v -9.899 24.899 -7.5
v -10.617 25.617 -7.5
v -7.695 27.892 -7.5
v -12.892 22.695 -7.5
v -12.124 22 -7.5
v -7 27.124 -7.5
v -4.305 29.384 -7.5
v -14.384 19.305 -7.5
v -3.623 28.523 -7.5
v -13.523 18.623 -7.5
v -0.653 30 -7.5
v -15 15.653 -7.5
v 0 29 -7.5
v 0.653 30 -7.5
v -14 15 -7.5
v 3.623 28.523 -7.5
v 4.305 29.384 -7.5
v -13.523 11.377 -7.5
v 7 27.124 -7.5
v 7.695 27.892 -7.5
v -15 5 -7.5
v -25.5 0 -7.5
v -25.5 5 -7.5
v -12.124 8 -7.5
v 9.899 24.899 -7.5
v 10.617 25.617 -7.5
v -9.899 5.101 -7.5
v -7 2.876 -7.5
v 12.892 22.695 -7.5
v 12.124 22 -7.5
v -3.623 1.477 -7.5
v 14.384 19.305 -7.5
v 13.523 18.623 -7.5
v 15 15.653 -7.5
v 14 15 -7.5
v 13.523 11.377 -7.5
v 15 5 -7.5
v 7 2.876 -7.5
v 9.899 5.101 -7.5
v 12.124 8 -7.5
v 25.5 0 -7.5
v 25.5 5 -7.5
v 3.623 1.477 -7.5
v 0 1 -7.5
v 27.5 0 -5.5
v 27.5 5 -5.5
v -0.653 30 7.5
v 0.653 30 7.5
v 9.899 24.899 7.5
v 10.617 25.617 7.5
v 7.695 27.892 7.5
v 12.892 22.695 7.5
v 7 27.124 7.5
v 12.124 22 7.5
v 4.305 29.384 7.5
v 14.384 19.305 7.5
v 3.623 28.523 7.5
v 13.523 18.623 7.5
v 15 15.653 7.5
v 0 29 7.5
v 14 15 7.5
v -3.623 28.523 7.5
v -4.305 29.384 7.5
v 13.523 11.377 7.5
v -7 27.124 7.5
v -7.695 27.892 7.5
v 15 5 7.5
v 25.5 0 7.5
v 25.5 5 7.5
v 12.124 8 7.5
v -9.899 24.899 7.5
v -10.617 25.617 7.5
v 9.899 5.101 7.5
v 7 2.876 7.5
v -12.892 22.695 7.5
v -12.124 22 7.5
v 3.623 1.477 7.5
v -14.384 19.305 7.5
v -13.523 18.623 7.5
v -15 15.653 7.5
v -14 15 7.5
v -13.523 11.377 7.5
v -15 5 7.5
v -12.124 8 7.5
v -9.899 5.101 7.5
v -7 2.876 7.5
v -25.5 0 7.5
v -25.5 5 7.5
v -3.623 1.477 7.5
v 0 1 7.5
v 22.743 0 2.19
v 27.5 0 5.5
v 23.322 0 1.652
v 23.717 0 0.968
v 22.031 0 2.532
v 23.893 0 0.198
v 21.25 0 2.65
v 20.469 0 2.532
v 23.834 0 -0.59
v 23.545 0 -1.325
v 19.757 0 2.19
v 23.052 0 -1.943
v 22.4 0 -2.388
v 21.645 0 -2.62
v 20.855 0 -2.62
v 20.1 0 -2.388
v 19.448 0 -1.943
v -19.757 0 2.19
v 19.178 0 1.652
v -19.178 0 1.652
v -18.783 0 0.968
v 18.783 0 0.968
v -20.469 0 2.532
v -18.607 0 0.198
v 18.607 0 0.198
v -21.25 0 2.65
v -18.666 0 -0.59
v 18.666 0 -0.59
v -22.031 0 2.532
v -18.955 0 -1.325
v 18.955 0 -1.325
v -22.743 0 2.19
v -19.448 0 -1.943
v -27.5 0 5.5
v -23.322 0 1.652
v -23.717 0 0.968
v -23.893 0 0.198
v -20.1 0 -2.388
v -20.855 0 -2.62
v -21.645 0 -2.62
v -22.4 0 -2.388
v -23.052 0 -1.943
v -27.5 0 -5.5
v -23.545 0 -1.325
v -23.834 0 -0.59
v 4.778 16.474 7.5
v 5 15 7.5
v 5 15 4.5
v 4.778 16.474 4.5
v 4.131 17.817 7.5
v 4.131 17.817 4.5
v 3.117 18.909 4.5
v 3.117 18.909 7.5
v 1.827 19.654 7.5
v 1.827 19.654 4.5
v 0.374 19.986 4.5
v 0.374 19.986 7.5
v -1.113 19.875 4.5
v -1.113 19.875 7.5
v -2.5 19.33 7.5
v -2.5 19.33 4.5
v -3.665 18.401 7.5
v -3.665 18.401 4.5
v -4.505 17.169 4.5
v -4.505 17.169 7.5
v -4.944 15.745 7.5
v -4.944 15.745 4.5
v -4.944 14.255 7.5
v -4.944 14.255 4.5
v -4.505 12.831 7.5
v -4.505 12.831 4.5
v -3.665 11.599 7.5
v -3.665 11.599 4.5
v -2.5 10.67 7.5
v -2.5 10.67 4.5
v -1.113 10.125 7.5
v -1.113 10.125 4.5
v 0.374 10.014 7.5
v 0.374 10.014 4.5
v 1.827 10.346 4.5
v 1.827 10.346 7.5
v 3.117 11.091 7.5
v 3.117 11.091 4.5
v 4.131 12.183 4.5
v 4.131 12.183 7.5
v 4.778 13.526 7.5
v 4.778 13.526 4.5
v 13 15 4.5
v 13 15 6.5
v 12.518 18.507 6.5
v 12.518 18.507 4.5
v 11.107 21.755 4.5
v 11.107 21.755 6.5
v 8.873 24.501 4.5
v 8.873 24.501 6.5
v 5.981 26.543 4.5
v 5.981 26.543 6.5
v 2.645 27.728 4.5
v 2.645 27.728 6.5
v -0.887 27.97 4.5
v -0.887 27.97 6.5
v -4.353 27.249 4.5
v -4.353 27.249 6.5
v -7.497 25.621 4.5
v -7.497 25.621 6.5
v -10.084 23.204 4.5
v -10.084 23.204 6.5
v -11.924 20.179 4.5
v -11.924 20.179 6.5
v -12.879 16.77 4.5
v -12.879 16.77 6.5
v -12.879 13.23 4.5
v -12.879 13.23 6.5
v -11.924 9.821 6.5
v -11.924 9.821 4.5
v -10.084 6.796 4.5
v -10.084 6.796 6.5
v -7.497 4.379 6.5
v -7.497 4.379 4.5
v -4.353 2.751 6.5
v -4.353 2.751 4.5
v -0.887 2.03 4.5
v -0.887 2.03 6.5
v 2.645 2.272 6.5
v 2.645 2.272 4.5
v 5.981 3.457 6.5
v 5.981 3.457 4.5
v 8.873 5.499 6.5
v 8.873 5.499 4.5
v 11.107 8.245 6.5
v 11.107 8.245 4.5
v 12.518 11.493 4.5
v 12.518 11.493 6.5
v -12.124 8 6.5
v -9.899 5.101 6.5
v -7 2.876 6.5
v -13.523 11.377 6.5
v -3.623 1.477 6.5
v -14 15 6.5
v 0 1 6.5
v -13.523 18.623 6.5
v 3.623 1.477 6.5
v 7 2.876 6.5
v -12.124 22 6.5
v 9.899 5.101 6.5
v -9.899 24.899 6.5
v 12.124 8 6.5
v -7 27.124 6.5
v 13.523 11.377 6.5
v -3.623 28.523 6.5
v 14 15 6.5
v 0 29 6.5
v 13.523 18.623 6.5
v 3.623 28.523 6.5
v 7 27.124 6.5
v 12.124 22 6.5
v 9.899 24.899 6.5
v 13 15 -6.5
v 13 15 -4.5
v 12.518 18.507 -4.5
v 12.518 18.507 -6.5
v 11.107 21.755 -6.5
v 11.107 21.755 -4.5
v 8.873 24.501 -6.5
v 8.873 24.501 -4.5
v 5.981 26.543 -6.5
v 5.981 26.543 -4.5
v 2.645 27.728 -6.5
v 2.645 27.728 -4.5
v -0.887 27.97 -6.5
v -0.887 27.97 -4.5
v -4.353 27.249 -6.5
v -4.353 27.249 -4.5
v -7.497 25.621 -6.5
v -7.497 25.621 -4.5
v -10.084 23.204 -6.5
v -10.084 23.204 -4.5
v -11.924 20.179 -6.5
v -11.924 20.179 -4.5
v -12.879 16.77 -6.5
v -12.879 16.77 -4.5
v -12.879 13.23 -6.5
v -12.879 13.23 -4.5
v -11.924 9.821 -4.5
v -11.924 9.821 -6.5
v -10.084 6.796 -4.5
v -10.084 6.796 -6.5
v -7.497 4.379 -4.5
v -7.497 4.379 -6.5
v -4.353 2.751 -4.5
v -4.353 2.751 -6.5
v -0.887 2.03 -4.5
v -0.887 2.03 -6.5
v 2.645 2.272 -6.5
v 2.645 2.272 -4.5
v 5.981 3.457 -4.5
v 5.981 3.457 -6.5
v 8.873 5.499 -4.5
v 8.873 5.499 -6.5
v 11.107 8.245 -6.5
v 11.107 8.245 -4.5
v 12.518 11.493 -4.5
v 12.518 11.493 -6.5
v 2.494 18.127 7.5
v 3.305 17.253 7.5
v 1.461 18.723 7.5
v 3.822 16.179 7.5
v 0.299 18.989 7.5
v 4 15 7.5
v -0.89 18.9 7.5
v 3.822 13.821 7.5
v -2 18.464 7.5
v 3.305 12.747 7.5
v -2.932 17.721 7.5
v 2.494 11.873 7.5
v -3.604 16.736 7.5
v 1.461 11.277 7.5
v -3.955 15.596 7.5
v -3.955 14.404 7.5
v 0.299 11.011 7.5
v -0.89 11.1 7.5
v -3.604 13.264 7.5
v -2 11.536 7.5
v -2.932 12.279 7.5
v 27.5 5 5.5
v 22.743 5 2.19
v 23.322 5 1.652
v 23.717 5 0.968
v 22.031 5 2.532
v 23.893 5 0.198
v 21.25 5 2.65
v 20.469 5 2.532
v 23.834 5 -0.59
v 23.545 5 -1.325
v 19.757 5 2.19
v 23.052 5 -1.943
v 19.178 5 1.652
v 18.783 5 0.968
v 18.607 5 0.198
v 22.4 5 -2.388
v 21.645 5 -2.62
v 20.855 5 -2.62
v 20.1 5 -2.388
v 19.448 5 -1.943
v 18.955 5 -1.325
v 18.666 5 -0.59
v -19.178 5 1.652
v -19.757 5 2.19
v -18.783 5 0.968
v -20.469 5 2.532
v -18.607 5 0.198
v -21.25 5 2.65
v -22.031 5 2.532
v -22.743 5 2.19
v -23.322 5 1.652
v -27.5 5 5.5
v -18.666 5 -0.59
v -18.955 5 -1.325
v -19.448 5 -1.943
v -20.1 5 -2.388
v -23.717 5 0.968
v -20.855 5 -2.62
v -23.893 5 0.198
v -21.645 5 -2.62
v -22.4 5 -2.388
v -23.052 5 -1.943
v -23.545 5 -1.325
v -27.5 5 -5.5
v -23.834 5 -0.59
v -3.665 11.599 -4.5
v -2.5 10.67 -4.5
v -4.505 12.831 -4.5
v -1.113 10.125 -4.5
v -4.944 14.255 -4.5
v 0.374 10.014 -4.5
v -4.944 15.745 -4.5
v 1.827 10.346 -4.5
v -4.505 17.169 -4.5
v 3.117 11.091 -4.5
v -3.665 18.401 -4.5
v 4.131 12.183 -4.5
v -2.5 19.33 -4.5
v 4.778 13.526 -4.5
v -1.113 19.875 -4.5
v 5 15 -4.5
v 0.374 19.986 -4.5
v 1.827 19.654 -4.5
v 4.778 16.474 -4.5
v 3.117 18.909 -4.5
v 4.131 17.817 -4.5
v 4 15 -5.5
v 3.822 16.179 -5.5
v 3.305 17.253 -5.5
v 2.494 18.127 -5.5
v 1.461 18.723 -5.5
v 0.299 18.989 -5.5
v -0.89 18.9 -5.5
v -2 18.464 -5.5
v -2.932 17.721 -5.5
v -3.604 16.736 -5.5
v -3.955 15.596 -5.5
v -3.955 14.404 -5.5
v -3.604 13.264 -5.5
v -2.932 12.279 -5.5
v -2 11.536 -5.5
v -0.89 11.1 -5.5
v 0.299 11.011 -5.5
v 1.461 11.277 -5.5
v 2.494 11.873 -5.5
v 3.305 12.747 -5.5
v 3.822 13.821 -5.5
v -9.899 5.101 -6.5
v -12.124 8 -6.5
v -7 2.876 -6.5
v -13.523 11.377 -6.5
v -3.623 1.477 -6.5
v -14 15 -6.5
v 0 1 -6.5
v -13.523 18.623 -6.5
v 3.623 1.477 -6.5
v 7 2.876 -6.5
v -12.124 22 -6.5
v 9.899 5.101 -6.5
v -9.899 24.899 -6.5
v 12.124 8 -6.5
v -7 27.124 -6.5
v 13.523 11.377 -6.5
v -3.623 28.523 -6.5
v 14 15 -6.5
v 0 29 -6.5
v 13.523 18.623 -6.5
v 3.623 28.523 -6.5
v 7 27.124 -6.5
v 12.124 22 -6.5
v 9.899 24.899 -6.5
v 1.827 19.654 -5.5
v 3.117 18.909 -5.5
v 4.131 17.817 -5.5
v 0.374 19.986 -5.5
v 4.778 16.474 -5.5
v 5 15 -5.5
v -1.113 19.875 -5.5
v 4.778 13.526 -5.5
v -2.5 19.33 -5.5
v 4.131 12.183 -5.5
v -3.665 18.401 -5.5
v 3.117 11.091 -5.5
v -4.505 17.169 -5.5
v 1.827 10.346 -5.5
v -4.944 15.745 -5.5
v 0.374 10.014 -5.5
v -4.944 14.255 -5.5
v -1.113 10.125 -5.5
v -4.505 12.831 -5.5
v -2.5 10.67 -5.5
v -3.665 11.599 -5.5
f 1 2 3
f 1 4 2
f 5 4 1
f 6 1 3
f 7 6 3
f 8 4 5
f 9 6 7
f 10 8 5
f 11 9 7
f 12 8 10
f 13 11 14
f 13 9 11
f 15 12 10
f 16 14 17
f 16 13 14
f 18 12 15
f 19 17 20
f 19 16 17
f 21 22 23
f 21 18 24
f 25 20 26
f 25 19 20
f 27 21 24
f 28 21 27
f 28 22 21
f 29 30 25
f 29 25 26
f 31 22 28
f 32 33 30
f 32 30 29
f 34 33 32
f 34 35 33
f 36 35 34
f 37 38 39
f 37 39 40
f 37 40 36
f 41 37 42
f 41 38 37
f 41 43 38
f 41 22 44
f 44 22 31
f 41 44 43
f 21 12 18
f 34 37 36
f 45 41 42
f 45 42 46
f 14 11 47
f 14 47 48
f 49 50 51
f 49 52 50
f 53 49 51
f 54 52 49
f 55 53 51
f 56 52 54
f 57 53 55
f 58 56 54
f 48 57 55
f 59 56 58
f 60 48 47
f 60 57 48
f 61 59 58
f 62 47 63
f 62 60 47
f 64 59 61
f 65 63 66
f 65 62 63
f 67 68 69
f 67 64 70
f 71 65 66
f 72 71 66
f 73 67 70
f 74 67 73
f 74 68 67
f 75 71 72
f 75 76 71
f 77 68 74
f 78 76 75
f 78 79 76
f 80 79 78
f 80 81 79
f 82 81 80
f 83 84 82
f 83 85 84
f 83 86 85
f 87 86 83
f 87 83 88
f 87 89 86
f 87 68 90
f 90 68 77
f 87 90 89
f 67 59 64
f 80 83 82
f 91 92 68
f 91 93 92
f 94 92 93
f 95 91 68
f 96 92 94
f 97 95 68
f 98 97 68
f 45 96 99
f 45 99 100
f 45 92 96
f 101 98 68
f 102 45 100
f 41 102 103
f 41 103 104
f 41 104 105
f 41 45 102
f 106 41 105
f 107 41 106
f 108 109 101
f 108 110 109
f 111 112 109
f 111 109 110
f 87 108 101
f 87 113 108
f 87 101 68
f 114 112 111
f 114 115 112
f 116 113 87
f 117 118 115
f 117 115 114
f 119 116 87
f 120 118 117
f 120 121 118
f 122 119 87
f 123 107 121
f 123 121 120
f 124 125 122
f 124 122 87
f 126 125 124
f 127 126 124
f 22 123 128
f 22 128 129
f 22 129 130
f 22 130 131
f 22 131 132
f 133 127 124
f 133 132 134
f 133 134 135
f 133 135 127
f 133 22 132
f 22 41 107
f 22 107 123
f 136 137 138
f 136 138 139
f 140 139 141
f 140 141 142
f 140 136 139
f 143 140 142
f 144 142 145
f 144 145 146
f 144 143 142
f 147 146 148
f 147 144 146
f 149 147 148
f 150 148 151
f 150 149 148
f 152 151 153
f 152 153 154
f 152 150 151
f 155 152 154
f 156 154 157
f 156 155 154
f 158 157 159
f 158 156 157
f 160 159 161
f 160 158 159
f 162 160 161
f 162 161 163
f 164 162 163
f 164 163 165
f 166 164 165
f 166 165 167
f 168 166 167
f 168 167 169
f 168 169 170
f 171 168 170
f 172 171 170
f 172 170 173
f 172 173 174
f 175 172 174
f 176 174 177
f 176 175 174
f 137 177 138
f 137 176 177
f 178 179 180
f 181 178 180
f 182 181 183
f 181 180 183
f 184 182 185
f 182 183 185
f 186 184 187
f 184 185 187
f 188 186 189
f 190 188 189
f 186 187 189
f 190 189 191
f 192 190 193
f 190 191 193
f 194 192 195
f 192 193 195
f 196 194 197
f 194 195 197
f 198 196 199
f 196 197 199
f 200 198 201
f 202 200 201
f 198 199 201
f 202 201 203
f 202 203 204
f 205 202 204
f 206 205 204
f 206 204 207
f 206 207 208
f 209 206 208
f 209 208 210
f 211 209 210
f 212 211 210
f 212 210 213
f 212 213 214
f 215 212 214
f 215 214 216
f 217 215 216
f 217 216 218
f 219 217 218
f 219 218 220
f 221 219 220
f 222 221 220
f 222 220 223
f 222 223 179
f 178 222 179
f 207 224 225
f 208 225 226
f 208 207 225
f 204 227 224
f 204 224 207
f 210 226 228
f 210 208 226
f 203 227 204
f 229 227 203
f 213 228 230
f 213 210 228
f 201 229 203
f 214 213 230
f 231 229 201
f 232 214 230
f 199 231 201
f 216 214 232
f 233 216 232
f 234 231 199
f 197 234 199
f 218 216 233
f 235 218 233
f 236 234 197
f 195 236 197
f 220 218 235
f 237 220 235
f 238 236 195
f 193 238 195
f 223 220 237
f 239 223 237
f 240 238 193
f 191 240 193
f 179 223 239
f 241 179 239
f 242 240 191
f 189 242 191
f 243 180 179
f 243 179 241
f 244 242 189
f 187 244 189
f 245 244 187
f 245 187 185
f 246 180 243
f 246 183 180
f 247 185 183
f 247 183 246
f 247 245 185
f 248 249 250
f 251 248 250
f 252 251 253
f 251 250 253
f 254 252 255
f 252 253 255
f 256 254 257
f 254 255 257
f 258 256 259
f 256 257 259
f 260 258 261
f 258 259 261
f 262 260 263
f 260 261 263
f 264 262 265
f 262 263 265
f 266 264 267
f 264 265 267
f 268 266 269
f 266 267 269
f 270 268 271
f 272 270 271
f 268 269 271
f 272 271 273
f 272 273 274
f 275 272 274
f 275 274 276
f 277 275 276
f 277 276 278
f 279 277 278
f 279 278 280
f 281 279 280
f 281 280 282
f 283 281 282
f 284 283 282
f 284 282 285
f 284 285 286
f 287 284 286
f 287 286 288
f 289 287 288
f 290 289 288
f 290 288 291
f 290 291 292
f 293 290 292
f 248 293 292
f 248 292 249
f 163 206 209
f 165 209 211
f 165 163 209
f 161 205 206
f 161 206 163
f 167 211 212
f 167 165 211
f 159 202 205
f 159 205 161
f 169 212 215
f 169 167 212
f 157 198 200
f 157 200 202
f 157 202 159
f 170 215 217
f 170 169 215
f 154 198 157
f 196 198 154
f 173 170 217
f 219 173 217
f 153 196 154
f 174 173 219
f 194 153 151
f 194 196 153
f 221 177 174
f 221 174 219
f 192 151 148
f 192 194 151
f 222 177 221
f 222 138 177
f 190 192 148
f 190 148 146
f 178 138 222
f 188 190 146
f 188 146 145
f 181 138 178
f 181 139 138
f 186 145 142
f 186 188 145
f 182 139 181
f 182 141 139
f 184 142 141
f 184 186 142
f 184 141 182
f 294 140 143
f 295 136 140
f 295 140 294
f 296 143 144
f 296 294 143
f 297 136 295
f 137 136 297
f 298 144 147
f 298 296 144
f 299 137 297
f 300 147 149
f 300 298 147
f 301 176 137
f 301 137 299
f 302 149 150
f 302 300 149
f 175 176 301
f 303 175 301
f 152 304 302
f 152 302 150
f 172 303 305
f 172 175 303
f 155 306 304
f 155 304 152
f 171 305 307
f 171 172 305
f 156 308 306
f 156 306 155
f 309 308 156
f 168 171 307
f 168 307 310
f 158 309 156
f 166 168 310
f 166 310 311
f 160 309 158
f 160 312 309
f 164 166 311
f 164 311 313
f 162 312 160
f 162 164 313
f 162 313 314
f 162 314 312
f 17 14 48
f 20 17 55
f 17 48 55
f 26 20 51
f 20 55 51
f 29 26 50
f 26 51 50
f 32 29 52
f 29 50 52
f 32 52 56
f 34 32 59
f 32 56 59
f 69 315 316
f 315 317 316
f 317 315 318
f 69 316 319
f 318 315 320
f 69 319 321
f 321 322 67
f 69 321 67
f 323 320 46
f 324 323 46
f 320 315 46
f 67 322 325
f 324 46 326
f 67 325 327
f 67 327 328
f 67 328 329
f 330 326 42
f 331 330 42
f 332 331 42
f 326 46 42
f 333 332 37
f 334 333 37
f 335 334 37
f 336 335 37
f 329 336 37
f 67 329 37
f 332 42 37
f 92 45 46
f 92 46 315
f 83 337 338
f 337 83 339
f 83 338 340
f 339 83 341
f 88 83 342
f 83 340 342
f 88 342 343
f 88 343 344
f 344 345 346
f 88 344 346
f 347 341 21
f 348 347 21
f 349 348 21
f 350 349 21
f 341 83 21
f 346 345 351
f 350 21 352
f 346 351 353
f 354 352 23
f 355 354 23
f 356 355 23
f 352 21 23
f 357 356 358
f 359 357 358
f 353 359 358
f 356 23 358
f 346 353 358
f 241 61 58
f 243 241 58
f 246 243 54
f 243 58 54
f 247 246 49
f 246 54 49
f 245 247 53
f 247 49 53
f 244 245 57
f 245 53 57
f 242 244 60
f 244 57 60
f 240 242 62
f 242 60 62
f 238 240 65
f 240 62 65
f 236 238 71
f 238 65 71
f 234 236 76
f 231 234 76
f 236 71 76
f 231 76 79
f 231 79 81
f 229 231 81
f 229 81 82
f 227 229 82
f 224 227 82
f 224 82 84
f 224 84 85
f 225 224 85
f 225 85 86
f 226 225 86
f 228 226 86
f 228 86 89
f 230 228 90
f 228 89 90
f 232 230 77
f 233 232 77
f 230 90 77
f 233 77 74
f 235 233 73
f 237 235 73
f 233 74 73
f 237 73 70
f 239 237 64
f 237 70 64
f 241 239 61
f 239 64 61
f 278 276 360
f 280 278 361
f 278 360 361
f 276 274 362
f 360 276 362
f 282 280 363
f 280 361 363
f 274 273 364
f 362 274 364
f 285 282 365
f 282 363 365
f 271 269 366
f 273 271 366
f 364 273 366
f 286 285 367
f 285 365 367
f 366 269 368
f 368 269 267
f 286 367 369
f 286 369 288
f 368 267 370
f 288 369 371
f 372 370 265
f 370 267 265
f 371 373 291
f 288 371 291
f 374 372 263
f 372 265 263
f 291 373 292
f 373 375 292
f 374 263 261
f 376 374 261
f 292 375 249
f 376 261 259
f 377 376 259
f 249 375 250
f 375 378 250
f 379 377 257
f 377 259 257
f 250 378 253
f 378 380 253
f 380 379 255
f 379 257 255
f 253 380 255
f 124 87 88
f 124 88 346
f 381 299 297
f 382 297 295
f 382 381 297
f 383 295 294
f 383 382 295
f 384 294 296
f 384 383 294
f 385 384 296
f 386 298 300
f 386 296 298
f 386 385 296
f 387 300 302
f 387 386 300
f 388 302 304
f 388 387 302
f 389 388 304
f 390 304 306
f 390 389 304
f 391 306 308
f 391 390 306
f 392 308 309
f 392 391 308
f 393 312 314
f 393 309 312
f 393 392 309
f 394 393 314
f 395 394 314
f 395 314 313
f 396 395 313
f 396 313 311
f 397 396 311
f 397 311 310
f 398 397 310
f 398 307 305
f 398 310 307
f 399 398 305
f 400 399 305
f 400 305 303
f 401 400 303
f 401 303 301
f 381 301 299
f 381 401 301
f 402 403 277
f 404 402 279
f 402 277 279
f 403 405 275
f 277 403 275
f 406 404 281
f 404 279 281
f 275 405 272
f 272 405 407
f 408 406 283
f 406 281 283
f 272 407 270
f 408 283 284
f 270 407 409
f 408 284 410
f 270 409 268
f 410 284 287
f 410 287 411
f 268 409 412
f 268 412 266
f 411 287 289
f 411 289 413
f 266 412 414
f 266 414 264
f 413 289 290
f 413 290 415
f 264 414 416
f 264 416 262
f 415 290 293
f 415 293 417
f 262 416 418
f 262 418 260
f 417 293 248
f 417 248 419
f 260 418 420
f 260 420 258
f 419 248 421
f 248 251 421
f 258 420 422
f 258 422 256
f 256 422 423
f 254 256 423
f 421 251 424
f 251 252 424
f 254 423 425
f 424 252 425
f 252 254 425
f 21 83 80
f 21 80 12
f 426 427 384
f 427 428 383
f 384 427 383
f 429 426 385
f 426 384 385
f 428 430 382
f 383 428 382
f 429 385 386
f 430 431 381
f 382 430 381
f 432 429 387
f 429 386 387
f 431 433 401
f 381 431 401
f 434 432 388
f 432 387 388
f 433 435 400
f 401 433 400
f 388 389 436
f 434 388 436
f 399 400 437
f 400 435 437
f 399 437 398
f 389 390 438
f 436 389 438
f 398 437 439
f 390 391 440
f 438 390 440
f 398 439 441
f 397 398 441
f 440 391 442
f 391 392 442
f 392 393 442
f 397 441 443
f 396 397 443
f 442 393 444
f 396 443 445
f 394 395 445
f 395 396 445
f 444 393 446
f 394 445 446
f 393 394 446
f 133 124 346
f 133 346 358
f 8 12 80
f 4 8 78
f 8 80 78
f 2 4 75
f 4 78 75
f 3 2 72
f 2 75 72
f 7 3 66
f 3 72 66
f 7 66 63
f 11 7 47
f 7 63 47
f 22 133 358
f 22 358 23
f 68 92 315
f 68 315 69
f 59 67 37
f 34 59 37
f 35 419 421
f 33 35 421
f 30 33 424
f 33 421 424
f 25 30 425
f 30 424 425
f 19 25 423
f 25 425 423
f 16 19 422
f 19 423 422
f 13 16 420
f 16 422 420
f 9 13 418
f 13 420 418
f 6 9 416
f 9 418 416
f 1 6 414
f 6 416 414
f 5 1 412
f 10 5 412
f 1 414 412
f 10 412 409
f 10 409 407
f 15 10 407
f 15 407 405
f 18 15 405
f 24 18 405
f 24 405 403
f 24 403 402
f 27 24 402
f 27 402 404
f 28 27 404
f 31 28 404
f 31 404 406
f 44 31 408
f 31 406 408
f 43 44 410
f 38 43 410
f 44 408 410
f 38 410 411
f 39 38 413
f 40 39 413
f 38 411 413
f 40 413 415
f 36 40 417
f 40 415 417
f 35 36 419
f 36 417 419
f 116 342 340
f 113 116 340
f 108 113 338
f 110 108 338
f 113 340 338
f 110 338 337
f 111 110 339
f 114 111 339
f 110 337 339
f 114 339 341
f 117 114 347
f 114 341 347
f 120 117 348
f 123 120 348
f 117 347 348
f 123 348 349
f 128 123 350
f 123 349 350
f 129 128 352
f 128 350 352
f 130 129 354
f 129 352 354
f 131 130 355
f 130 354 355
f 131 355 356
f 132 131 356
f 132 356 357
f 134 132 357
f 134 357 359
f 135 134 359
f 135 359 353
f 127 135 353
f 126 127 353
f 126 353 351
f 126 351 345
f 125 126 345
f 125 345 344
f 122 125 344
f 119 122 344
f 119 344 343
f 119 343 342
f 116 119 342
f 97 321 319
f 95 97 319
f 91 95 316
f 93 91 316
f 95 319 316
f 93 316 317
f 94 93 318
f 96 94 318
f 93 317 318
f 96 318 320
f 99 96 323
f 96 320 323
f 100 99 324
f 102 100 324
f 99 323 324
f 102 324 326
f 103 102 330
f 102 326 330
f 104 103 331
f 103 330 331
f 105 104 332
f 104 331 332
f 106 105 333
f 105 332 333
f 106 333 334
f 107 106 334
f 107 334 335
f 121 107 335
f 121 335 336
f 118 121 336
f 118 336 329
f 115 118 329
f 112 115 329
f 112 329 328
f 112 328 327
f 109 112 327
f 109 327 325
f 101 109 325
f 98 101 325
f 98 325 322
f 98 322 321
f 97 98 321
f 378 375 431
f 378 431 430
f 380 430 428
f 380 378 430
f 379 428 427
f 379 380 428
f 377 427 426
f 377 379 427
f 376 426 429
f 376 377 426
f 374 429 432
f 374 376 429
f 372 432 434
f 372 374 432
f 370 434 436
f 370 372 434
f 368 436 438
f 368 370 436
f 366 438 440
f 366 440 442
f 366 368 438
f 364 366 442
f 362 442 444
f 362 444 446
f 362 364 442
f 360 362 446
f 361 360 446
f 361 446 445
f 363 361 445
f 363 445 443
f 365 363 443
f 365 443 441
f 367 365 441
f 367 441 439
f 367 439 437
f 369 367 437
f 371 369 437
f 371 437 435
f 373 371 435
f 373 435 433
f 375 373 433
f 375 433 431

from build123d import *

# Parameters (mm, degrees)
BOSS_EXTRUDE1_DEPTH     = 5
SKETCH2_W               = 30
SKETCH2_H               = 15
BOSS_EXTRUDE2_DEPTH     = 25
CUT_EXTRUDE1_DEPTH      = 44.373378932
SKETCH3_3_R             = 14
SKETCH3_3_R_2           = 13
CUT_EXTRUDE2_DEPTH      = 1
CUT_EXTRUDE3_DEPTH      = 44.373378932
CUT_EXTRUDE3_DEPTH_BACK = 44.373378932
SKETCH3_4_R             = 4
SKETCH3_5_R             = 13
SKETCH3_5_R_2           = 5
CUT_EXTRUDE4_DEPTH      = 3
CUT_EXTRUDE5_START      = 3
SKETCH5_R               = 13
SKETCH5_R_2             = 5
CUT_EXTRUDE5_DEPTH      = 3
CUT_EXTRUDE8_START      = 1
SKETCH5_8_R             = 14
SKETCH5_8_R_2           = 13
CUT_EXTRUDE8_DEPTH      = 1
CUT_EXTRUDE9_START      = 2
SKETCH5_9_R             = 5
SKETCH5_9_R_2           = 4
CUT_EXTRUDE9_DEPTH      = 2
SKETCH6_R               = 2.65
CUT_EXTRUDE10_DEPTH     = 38.91437722


with BuildPart() as part:
    # Sketch1 → Boss-Extrude1 (new body)
    with BuildSketch(Plane(origin=(0, 0, 0), x_dir=(1, 0, 0), z_dir=(0, 1, 0))):
        Polygon((25.5, 7.5), (27.5, 5.5), (27.5, -5.5), (25.5, -7.5), (-25.5, -7.5), (-27.5, -5.5), (-27.5, 5.5), (-25.5, 7.5), align=None)
    extrude(amount=BOSS_EXTRUDE1_DEPTH)

    # Sketch2 → Boss-Extrude2 (add)
    with BuildSketch(Plane(origin=(0, 5, 0), x_dir=(1, 0, 0), z_dir=(0, 1, 0))):
        Rectangle(SKETCH2_W, SKETCH2_H)
    extrude(amount=BOSS_EXTRUDE2_DEPTH)

    # Sketch3 → Cut-Extrude1 (cut, through all)
    with BuildSketch(Plane.XY.offset(7.5)):
        with BuildLine():
            Line((-15, 30), (-15, 15.652790041))
            ThreePointArc((-15, 15.652790041), (-10.616641061, 25.616641061), (-0.652790041, 30))
            Line((-0.652790041, 30), (-15, 30))
        make_face()
        with BuildLine():
            ThreePointArc((0.652790041, 30), (10.616641061, 25.616641061), (15, 15.652790041))
            Line((15, 15.652790041), (15, 30))
            Line((15, 30), (0.652790041, 30))
        make_face()
    extrude(amount=-CUT_EXTRUDE1_DEPTH, mode=Mode.SUBTRACT)

    # Sketch3<3> → Cut-Extrude2 (cut)
    with BuildSketch(Plane.XY.offset(7.5)):
        with Locations((0, 15)):
            Circle(SKETCH3_3_R)
        with Locations((0, 15)):
            Circle(SKETCH3_3_R_2, mode=Mode.SUBTRACT)
    extrude(amount=-CUT_EXTRUDE2_DEPTH, mode=Mode.SUBTRACT)

    # Sketch3<4> → Cut-Extrude3 (cut, two sides: drawn at the far end of the back side and taken through both)
    with BuildSketch(Plane.XY.offset(7.5).offset(-CUT_EXTRUDE3_DEPTH_BACK)):
        with Locations((0, 15)):
            Circle(SKETCH3_4_R)
    extrude(amount=CUT_EXTRUDE3_DEPTH + CUT_EXTRUDE3_DEPTH_BACK, mode=Mode.SUBTRACT)

    # Sketch3<5> → Cut-Extrude4 (cut)
    with BuildSketch(Plane.XY.offset(7.5)):
        with Locations((0, 15)):
            Circle(SKETCH3_5_R)
        with Locations((0, 15)):
            Circle(SKETCH3_5_R_2, mode=Mode.SUBTRACT)
    extrude(amount=-CUT_EXTRUDE4_DEPTH, mode=Mode.SUBTRACT)

    # Sketch5 → Cut-Extrude5 (cut)
    with BuildSketch(Plane.XY.offset(-7.5).offset(CUT_EXTRUDE5_START)):
        with Locations((0, 15)):
            Circle(SKETCH5_R)
        with Locations((0, 15)):
            Circle(SKETCH5_R_2, mode=Mode.SUBTRACT)
    extrude(amount=-CUT_EXTRUDE5_DEPTH, mode=Mode.SUBTRACT)

    # Sketch5<8> → Cut-Extrude8 (cut)
    with BuildSketch(Plane.XY.offset(-7.5).offset(CUT_EXTRUDE8_START)):
        with Locations((0, 15)):
            Circle(SKETCH5_8_R)
        with Locations(Location((0, 15, 0), (0, 0, 180))):
            Circle(SKETCH5_8_R_2, mode=Mode.SUBTRACT)
    extrude(amount=-CUT_EXTRUDE8_DEPTH, mode=Mode.SUBTRACT)

    # Sketch5<9> → Cut-Extrude9 (cut)
    with BuildSketch(Plane.XY.offset(-7.5).offset(CUT_EXTRUDE9_START)):
        with Locations(Location((0, 15, 0), (0, 0, 180))):
            Circle(SKETCH5_9_R)
        with Locations((0, 15)):
            Circle(SKETCH5_9_R_2, mode=Mode.SUBTRACT)
    extrude(amount=-CUT_EXTRUDE9_DEPTH, mode=Mode.SUBTRACT)

    # Sketch6 → Cut-Extrude10 (cut, through all)
    with BuildSketch(Plane(origin=(0, 5, 0), x_dir=(1, 0, 0), z_dir=(0, 1, 0))):
        with Locations(Location((-21.25, 0, 0), (0, 0, 270))):
            Circle(SKETCH6_R)
        with Locations(Location((21.25, 0, 0), (0, 0, 270))):
            Circle(SKETCH6_R)
    extrude(amount=-CUT_EXTRUDE10_DEPTH, mode=Mode.SUBTRACT)


solid = part.part
